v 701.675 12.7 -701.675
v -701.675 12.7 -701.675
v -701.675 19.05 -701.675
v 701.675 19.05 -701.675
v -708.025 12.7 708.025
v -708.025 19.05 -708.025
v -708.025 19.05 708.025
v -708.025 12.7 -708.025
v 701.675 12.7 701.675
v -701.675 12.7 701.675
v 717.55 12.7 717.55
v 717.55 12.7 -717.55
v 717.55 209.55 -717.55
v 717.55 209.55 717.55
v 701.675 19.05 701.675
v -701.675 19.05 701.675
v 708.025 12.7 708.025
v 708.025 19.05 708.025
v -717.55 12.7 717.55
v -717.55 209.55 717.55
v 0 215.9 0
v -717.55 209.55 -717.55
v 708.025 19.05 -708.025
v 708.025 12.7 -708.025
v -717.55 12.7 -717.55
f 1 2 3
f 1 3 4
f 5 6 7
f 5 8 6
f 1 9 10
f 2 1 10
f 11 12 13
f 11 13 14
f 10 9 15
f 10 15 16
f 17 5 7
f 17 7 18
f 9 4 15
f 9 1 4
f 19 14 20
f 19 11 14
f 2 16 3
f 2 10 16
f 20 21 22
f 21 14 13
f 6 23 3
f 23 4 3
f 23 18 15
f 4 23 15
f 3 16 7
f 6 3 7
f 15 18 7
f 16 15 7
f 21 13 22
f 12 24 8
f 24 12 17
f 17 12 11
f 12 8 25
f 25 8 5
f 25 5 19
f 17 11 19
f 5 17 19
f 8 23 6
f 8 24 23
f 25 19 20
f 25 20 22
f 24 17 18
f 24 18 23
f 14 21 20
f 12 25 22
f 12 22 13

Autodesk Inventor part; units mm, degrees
ref_plane "YZ Plane" through (0, 0, 0) normal (1, 0, 0) x (0, 1, 0)
ref_plane "XZ Plane" through (0, 0, 0) normal (0, 1, 0) x (-1, 0, 0)
ref_plane "XY Plane" through (0, 0, 0) normal (0, 0, 1) x (1, 0, 0)
sketch "Sketch1" plane through (0, 0, 0) normal (0, 1, 0) x (-1, 0, 0)
  line L0 (717.55, -717.55) -> (-717.55, -717.55)
  line L1 (-717.55, -717.55) -> (-717.55, 717.55)
  line L2 (-717.55, 717.55) -> (717.55, 717.55)
  line L3 (717.55, 717.55) -> (717.55, -717.55)
  line L4 (717.55, -717.55) -> (-717.55, 717.55) construction
  line L5 (-717.55, -717.55) -> (717.55, 717.55) construction
  line L6 (-708.025, -708.025) -> (708.025, -708.025)
  line L7 (708.025, -708.025) -> (708.025, 708.025)
  line L8 (708.025, 708.025) -> (-708.025, 708.025)
  line L9 (-708.025, 708.025) -> (-708.025, -708.025)
  line L10 (701.675, -701.675) -> (-701.675, -701.675)
  line L11 (-701.675, -701.675) -> (-701.675, 701.675)
  line L12 (-701.675, 701.675) -> (701.675, 701.675)
  line L13 (701.675, 701.675) -> (701.675, -701.675)
  point P0 (0, 0)
  dimension "d0" = 1435.1
  dimension "d1" = 1435.1
  dimension "d2" = 9.525
  dimension "d3" = 6.35
extrude "Extrusion1" add sketch "Sketch1" along normal blind 215.9 contours L0 L1 L2 L3 | L9 L8 L7 L6 | L10 L11 L12 L13
sketch "Sketch2" plane through (-717.55, 0, 717.55) normal (0, 0, 1) x (1, 0, 0)
  line L0 (0, 0) -> (1435.1, 0) projected
  line L1 (1435.1, 0) -> (1435.1, 215.9) projected
  line L2 (0, 215.9) -> (1435.1, 215.9) projected
  line L3 (0, 0) -> (0, 215.9) projected
  line L4 (0, 215.9) -> (1435.1, 215.9) projected
  line L5 (717.55, 215.9) -> (0, 209.55)
  line L6 (0, 215.9) -> (0, 209.55)
  line L7 (0, 0) -> (0, 215.9) projected
  line L8 (0, 215.9) -> (717.55, 215.9)
  line L9 (717.55, 215.9) -> (1435.1, 215.9)
  line L10 (1435.1, 0) -> (1435.1, 215.9) projected
  line L11 (1435.1, 215.9) -> (1435.1, 209.55)
  line L12 (1435.1, 209.55) -> (717.55, 215.9)
  point P0 (717.55, 0)
  dimension "d6" = 6.35
  dimension "d7" = 6.35
sketch "Sketch3" plane through (717.55, 0, 717.55) normal (1, 0, 0) x (0, 0, -1)
  line L0 (0, 0) -> (1435.1, 0) projected
  line L1 (1435.1, 0) -> (1435.1, 215.9) projected
  line L2 (0, 215.9) -> (1435.1, 215.9) projected
  line L3 (0, 0) -> (0, 215.9) projected
  line L4 (0, 215.9) -> (1435.1, 215.9) projected
  line L5 (717.55, 215.9) -> (0, 209.55)
  line L6 (0, 0) -> (0, 215.9) projected
  line L7 (0, 215.9) -> (0, 209.55)
  line L8 (0, 215.9) -> (717.55, 215.9)
  line L9 (717.55, 215.9) -> (1435.1, 215.9)
  line L10 (1435.1, 0) -> (1435.1, 215.9) projected
  line L11 (1435.1, 215.9) -> (1435.1, 209.55)
  line L12 (1435.1, 209.55) -> (717.55, 215.9)
  point P0 (717.55, 0)
  point P1 (0, 209.55)
  dimension "d8" = 6.35
  dimension "d9" = 6.35
extrude "Extrusion2" cut sketch "Sketch2" against normal through all contours L3 L2 L5 | L12 L2 L1
extrude "Extrusion3" cut sketch "Sketch3" against normal through all contours L3 L2 L5 | L12 L2 L1
extrude "Extrusion4" cut sketch "Sketch1" along normal blind 19.05 contours L9 L8 L7 L6
extrude "Extrusion5" cut sketch "Sketch1" along normal blind 12.7
properties part number "D - Cap - 2" material "Granite, Cut, Polished"
